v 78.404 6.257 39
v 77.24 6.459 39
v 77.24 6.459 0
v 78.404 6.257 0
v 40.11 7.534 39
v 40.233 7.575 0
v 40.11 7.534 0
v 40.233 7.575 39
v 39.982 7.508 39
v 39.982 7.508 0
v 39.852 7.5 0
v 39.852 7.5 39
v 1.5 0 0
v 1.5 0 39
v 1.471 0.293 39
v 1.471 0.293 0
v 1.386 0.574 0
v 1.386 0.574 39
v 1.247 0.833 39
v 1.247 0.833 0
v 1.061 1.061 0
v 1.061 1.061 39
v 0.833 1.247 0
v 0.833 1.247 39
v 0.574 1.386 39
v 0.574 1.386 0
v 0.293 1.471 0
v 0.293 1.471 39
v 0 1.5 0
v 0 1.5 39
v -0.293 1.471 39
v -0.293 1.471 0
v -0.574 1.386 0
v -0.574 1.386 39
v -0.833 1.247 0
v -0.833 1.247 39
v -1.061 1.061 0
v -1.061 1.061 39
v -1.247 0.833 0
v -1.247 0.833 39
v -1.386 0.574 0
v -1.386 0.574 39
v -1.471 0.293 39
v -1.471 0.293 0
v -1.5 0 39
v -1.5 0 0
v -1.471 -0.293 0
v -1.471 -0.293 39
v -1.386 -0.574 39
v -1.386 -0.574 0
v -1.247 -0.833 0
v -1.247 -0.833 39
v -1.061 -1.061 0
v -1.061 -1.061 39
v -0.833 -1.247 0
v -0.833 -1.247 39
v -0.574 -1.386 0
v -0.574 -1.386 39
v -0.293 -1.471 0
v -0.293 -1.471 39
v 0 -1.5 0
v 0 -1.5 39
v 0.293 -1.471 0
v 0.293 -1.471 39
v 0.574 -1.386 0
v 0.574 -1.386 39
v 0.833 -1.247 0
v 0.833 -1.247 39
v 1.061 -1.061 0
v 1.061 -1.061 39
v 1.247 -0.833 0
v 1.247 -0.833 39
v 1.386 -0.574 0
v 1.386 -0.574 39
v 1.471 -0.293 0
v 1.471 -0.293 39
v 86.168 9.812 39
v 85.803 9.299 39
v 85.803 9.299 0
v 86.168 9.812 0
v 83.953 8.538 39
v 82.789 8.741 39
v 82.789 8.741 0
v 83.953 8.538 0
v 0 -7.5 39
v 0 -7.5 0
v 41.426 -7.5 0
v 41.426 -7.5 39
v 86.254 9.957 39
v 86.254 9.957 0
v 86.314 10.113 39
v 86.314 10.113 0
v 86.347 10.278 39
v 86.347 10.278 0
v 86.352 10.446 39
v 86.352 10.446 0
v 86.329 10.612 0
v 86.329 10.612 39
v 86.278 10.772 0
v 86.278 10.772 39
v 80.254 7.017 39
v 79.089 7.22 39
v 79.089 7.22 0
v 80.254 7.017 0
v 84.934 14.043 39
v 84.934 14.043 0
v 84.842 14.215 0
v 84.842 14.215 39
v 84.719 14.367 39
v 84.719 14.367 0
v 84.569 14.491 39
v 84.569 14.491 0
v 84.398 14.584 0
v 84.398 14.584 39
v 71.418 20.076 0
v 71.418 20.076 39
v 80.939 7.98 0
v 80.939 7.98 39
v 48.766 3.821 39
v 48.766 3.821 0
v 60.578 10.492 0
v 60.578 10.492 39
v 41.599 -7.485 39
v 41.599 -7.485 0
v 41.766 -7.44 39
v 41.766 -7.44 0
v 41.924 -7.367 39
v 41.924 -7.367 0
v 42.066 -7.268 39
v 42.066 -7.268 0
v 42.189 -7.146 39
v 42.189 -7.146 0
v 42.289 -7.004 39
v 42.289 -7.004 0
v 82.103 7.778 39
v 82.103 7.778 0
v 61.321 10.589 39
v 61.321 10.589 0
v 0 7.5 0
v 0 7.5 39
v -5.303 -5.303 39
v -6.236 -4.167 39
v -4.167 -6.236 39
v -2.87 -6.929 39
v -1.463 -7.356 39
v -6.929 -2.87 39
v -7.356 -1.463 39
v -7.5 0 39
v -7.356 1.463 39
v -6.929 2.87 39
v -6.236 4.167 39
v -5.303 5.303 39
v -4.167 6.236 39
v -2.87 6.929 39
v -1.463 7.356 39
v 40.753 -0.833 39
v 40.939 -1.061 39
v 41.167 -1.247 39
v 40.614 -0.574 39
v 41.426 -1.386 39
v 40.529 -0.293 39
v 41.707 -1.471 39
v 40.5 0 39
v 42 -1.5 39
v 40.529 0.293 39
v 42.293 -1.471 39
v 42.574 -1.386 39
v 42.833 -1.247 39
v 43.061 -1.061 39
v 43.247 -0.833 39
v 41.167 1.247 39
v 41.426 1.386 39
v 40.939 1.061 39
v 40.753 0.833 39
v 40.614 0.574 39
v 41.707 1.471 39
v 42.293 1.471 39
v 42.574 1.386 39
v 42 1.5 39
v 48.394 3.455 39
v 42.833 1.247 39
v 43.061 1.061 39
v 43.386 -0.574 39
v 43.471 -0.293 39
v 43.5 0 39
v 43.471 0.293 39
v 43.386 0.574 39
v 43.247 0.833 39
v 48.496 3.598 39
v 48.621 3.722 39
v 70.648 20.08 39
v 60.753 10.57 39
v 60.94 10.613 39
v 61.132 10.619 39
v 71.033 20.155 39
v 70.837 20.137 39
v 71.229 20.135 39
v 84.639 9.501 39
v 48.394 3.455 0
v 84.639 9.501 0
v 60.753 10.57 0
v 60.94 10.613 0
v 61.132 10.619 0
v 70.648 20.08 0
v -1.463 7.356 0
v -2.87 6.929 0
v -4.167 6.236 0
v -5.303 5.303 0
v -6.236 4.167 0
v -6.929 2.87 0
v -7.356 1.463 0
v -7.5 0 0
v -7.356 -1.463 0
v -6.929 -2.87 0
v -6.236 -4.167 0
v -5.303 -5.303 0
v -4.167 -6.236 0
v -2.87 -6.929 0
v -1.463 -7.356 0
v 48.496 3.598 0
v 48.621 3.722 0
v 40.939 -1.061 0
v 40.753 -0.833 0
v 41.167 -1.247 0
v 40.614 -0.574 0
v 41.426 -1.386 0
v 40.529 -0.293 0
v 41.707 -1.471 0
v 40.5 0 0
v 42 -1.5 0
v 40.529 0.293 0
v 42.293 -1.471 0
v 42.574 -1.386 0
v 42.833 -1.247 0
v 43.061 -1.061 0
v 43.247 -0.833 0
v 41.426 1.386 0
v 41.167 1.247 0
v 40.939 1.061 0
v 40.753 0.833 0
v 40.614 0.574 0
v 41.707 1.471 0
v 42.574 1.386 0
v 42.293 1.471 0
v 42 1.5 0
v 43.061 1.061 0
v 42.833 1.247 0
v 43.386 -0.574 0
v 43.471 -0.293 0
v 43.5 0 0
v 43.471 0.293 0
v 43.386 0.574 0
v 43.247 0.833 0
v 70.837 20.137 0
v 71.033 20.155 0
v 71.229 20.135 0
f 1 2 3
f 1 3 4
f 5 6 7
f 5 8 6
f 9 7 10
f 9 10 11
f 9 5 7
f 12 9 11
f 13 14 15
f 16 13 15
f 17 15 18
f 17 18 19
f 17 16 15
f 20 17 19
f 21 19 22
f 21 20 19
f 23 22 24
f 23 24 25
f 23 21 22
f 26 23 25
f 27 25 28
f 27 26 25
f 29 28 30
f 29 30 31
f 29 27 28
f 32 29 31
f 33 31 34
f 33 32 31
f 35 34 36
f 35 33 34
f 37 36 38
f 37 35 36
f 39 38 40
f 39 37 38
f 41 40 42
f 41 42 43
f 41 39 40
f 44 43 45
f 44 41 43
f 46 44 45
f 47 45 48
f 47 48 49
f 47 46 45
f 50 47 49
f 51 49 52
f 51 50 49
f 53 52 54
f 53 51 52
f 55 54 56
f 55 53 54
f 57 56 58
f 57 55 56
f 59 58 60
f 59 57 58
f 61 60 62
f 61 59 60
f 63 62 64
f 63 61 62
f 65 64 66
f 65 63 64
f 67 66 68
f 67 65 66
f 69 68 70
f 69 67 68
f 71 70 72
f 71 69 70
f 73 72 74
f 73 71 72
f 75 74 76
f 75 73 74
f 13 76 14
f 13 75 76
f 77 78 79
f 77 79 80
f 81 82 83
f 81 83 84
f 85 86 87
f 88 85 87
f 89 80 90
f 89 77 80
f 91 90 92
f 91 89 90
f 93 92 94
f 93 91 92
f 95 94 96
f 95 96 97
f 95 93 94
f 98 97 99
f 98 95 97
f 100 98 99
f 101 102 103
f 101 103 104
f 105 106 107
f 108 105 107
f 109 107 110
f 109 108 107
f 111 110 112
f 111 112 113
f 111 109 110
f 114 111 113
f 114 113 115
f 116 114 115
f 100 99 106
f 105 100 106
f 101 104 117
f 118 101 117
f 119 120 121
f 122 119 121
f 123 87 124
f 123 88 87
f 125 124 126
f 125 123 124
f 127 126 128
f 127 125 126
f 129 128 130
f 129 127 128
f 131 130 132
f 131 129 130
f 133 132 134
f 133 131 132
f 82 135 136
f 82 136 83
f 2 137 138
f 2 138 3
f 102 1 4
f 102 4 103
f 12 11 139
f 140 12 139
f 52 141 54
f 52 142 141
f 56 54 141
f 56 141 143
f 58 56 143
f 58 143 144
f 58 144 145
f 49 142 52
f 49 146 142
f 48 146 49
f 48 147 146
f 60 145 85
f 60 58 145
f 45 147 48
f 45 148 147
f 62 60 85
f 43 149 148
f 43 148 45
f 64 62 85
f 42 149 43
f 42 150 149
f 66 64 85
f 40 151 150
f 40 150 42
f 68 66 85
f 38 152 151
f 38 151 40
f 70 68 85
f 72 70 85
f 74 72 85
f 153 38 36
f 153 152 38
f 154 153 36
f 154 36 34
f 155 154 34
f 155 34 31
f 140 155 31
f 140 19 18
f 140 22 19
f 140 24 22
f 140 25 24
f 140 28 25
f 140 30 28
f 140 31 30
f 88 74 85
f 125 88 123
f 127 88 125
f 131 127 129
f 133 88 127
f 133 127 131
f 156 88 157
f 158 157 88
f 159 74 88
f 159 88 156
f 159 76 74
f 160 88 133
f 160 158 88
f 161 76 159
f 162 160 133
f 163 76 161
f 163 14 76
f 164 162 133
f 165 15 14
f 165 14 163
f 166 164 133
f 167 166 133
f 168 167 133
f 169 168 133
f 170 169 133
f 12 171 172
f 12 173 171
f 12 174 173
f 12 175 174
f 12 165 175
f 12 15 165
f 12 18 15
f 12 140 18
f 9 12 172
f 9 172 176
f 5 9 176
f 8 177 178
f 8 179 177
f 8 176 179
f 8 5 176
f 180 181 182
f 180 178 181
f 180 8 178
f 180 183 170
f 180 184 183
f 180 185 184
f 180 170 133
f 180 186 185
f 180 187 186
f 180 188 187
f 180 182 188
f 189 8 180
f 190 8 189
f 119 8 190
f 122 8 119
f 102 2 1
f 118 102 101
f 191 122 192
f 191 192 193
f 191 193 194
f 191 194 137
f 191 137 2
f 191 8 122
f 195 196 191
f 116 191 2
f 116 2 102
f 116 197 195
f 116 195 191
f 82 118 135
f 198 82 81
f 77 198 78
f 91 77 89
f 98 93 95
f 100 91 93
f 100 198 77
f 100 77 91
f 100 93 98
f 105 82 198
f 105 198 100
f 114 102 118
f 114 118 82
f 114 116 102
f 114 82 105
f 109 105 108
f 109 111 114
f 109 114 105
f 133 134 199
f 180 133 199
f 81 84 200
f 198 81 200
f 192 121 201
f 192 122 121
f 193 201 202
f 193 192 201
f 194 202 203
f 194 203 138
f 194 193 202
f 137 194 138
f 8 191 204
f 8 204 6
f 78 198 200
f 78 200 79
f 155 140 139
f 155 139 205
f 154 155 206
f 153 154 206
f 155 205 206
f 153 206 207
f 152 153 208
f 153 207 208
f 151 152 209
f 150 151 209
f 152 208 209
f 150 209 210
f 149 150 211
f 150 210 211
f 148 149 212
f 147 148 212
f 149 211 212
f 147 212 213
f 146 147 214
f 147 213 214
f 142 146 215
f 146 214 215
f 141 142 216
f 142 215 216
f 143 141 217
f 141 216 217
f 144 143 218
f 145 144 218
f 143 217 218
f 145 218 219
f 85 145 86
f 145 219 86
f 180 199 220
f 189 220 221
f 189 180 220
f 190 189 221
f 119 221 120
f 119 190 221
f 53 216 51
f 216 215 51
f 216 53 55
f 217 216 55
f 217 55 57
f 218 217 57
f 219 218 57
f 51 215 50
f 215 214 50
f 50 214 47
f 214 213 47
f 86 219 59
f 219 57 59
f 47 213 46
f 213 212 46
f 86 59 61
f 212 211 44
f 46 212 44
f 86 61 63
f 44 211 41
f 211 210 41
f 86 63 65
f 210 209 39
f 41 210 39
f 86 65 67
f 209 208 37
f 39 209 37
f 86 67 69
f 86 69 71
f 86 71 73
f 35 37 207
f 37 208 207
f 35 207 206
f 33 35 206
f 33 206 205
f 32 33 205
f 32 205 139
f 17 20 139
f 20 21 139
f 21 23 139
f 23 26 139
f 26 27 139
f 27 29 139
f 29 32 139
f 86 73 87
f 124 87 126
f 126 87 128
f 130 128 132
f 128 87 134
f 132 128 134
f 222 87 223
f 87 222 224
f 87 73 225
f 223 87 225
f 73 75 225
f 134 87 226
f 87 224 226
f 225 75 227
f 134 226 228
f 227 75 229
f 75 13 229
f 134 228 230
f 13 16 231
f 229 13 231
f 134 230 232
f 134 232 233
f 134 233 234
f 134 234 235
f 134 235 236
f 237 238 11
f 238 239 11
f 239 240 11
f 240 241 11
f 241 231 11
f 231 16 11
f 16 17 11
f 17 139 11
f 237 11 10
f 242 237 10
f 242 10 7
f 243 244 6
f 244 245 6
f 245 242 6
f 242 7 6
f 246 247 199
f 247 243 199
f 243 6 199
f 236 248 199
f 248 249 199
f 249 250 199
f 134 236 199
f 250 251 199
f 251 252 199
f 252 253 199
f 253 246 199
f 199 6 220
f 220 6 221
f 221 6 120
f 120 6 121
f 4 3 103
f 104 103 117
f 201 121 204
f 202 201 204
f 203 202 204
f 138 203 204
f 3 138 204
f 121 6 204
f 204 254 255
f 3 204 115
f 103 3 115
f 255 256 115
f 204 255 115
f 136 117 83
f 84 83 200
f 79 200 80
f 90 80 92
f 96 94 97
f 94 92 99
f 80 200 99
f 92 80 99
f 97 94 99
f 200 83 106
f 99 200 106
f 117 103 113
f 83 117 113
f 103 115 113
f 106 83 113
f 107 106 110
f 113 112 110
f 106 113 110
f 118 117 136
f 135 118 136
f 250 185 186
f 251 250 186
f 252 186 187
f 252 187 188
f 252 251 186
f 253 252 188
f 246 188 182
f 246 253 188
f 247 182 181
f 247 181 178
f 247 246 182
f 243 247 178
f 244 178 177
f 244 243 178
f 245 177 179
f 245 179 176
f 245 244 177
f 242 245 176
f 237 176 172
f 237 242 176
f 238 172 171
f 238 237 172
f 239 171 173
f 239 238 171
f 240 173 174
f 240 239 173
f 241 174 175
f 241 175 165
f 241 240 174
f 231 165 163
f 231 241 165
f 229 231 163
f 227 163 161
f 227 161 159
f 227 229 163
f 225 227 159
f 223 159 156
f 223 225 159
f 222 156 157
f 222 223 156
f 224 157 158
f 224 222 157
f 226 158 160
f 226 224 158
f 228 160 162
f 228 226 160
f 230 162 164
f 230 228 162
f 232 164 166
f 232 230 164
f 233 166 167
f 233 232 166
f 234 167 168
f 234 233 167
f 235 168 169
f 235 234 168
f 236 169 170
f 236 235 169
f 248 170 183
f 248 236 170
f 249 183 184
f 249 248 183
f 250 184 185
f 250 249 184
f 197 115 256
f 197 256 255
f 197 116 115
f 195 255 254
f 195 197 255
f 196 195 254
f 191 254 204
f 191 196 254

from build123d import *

# Parameters (mm, degrees)
SKETCH1_R           = 1.5
BOSS_EXTRUDE1_DEPTH = 39
FILLET1_R           = 1


with BuildPart() as part:
    # Sketch1 → Boss-Extrude1 (new body)
    with BuildSketch(Plane.XY):
        with BuildLine():
            Line((40.05, 7.5), (0, 7.5))
            ThreePointArc((0, 7.5), (-7.5, 0), (0, -7.5))
            Line((0, -7.5), (42, -7.5))
            Line((42, -7.5), (48.530525776, 3.688120536))
            ThreePointArc((48.530525776, 3.688120536), (45.780813139, 6.477302835), (42, 7.5))
            Line((42, 7.5), (40.05, 7.5))
        make_face()
        Circle(SKETCH1_R, mode=Mode.SUBTRACT)
        with Locations((42, 0)):
            Circle(SKETCH1_R, mode=Mode.SUBTRACT)
        with BuildLine():
            Line((71.033420644, 20.238824327), (40.05, 7.5))
            Line((40.05, 7.5), (42, 7.5))
            ThreePointArc((42, 7.5), (45.780813139, 6.477302835), (48.530525776, 3.688120536))
            Line((48.530525776, 3.688120536), (60.929817382, 10.690632061))
            Line((60.929817382, 10.690632061), (77.239530905, 6.459175571))
            Line((77.239530905, 6.459175571), (78.403975083, 6.2567657))
            Line((78.403975083, 6.2567657), (79.089287361, 7.219702396))
            Line((79.089287361, 7.219702396), (80.253731539, 7.017292525))
            Line((80.253731539, 7.017292525), (80.939043817, 7.980229222))
            Line((80.939043817, 7.980229222), (82.103487996, 7.777819351))
            Line((82.103487996, 7.777819351), (82.788800274, 8.740756047))
            Line((82.788800274, 8.740756047), (83.953244452, 8.538346176))
            Line((83.953244452, 8.538346176), (84.63855673, 9.501282873))
            Line((84.63855673, 9.501282873), (85.803000908, 9.298873002))
            Line((85.803000908, 9.298873002), (86.488313186, 10.261809698))
            Line((86.488313186, 10.261809698), (84.777127829, 14.423761725))
            Line((84.777127829, 14.423761725), (71.033420644, 20.238824327))
        make_face()
    extrude(amount=BOSS_EXTRUDE1_DEPTH)

    # Fillet1
    fillet1_edges = [part.edges().sort_by_distance(p)[0] for p in [
        (42, -7.5, 19.5),
        (40.05, 7.5, 19.5),
        (71.033420644, 20.238824327, 19.5),
        (84.777127829, 14.423761725, 19.5),
        (86.488313186, 10.261809698, 19.5),
        (77.239530905, 6.459175571, 19.5),
        (60.929817382, 10.690632061, 19.5),
        (48.530525776, 3.688120536, 19.5),
    ]]
    fillet(fillet1_edges, radius=FILLET1_R)


solid = part.part
